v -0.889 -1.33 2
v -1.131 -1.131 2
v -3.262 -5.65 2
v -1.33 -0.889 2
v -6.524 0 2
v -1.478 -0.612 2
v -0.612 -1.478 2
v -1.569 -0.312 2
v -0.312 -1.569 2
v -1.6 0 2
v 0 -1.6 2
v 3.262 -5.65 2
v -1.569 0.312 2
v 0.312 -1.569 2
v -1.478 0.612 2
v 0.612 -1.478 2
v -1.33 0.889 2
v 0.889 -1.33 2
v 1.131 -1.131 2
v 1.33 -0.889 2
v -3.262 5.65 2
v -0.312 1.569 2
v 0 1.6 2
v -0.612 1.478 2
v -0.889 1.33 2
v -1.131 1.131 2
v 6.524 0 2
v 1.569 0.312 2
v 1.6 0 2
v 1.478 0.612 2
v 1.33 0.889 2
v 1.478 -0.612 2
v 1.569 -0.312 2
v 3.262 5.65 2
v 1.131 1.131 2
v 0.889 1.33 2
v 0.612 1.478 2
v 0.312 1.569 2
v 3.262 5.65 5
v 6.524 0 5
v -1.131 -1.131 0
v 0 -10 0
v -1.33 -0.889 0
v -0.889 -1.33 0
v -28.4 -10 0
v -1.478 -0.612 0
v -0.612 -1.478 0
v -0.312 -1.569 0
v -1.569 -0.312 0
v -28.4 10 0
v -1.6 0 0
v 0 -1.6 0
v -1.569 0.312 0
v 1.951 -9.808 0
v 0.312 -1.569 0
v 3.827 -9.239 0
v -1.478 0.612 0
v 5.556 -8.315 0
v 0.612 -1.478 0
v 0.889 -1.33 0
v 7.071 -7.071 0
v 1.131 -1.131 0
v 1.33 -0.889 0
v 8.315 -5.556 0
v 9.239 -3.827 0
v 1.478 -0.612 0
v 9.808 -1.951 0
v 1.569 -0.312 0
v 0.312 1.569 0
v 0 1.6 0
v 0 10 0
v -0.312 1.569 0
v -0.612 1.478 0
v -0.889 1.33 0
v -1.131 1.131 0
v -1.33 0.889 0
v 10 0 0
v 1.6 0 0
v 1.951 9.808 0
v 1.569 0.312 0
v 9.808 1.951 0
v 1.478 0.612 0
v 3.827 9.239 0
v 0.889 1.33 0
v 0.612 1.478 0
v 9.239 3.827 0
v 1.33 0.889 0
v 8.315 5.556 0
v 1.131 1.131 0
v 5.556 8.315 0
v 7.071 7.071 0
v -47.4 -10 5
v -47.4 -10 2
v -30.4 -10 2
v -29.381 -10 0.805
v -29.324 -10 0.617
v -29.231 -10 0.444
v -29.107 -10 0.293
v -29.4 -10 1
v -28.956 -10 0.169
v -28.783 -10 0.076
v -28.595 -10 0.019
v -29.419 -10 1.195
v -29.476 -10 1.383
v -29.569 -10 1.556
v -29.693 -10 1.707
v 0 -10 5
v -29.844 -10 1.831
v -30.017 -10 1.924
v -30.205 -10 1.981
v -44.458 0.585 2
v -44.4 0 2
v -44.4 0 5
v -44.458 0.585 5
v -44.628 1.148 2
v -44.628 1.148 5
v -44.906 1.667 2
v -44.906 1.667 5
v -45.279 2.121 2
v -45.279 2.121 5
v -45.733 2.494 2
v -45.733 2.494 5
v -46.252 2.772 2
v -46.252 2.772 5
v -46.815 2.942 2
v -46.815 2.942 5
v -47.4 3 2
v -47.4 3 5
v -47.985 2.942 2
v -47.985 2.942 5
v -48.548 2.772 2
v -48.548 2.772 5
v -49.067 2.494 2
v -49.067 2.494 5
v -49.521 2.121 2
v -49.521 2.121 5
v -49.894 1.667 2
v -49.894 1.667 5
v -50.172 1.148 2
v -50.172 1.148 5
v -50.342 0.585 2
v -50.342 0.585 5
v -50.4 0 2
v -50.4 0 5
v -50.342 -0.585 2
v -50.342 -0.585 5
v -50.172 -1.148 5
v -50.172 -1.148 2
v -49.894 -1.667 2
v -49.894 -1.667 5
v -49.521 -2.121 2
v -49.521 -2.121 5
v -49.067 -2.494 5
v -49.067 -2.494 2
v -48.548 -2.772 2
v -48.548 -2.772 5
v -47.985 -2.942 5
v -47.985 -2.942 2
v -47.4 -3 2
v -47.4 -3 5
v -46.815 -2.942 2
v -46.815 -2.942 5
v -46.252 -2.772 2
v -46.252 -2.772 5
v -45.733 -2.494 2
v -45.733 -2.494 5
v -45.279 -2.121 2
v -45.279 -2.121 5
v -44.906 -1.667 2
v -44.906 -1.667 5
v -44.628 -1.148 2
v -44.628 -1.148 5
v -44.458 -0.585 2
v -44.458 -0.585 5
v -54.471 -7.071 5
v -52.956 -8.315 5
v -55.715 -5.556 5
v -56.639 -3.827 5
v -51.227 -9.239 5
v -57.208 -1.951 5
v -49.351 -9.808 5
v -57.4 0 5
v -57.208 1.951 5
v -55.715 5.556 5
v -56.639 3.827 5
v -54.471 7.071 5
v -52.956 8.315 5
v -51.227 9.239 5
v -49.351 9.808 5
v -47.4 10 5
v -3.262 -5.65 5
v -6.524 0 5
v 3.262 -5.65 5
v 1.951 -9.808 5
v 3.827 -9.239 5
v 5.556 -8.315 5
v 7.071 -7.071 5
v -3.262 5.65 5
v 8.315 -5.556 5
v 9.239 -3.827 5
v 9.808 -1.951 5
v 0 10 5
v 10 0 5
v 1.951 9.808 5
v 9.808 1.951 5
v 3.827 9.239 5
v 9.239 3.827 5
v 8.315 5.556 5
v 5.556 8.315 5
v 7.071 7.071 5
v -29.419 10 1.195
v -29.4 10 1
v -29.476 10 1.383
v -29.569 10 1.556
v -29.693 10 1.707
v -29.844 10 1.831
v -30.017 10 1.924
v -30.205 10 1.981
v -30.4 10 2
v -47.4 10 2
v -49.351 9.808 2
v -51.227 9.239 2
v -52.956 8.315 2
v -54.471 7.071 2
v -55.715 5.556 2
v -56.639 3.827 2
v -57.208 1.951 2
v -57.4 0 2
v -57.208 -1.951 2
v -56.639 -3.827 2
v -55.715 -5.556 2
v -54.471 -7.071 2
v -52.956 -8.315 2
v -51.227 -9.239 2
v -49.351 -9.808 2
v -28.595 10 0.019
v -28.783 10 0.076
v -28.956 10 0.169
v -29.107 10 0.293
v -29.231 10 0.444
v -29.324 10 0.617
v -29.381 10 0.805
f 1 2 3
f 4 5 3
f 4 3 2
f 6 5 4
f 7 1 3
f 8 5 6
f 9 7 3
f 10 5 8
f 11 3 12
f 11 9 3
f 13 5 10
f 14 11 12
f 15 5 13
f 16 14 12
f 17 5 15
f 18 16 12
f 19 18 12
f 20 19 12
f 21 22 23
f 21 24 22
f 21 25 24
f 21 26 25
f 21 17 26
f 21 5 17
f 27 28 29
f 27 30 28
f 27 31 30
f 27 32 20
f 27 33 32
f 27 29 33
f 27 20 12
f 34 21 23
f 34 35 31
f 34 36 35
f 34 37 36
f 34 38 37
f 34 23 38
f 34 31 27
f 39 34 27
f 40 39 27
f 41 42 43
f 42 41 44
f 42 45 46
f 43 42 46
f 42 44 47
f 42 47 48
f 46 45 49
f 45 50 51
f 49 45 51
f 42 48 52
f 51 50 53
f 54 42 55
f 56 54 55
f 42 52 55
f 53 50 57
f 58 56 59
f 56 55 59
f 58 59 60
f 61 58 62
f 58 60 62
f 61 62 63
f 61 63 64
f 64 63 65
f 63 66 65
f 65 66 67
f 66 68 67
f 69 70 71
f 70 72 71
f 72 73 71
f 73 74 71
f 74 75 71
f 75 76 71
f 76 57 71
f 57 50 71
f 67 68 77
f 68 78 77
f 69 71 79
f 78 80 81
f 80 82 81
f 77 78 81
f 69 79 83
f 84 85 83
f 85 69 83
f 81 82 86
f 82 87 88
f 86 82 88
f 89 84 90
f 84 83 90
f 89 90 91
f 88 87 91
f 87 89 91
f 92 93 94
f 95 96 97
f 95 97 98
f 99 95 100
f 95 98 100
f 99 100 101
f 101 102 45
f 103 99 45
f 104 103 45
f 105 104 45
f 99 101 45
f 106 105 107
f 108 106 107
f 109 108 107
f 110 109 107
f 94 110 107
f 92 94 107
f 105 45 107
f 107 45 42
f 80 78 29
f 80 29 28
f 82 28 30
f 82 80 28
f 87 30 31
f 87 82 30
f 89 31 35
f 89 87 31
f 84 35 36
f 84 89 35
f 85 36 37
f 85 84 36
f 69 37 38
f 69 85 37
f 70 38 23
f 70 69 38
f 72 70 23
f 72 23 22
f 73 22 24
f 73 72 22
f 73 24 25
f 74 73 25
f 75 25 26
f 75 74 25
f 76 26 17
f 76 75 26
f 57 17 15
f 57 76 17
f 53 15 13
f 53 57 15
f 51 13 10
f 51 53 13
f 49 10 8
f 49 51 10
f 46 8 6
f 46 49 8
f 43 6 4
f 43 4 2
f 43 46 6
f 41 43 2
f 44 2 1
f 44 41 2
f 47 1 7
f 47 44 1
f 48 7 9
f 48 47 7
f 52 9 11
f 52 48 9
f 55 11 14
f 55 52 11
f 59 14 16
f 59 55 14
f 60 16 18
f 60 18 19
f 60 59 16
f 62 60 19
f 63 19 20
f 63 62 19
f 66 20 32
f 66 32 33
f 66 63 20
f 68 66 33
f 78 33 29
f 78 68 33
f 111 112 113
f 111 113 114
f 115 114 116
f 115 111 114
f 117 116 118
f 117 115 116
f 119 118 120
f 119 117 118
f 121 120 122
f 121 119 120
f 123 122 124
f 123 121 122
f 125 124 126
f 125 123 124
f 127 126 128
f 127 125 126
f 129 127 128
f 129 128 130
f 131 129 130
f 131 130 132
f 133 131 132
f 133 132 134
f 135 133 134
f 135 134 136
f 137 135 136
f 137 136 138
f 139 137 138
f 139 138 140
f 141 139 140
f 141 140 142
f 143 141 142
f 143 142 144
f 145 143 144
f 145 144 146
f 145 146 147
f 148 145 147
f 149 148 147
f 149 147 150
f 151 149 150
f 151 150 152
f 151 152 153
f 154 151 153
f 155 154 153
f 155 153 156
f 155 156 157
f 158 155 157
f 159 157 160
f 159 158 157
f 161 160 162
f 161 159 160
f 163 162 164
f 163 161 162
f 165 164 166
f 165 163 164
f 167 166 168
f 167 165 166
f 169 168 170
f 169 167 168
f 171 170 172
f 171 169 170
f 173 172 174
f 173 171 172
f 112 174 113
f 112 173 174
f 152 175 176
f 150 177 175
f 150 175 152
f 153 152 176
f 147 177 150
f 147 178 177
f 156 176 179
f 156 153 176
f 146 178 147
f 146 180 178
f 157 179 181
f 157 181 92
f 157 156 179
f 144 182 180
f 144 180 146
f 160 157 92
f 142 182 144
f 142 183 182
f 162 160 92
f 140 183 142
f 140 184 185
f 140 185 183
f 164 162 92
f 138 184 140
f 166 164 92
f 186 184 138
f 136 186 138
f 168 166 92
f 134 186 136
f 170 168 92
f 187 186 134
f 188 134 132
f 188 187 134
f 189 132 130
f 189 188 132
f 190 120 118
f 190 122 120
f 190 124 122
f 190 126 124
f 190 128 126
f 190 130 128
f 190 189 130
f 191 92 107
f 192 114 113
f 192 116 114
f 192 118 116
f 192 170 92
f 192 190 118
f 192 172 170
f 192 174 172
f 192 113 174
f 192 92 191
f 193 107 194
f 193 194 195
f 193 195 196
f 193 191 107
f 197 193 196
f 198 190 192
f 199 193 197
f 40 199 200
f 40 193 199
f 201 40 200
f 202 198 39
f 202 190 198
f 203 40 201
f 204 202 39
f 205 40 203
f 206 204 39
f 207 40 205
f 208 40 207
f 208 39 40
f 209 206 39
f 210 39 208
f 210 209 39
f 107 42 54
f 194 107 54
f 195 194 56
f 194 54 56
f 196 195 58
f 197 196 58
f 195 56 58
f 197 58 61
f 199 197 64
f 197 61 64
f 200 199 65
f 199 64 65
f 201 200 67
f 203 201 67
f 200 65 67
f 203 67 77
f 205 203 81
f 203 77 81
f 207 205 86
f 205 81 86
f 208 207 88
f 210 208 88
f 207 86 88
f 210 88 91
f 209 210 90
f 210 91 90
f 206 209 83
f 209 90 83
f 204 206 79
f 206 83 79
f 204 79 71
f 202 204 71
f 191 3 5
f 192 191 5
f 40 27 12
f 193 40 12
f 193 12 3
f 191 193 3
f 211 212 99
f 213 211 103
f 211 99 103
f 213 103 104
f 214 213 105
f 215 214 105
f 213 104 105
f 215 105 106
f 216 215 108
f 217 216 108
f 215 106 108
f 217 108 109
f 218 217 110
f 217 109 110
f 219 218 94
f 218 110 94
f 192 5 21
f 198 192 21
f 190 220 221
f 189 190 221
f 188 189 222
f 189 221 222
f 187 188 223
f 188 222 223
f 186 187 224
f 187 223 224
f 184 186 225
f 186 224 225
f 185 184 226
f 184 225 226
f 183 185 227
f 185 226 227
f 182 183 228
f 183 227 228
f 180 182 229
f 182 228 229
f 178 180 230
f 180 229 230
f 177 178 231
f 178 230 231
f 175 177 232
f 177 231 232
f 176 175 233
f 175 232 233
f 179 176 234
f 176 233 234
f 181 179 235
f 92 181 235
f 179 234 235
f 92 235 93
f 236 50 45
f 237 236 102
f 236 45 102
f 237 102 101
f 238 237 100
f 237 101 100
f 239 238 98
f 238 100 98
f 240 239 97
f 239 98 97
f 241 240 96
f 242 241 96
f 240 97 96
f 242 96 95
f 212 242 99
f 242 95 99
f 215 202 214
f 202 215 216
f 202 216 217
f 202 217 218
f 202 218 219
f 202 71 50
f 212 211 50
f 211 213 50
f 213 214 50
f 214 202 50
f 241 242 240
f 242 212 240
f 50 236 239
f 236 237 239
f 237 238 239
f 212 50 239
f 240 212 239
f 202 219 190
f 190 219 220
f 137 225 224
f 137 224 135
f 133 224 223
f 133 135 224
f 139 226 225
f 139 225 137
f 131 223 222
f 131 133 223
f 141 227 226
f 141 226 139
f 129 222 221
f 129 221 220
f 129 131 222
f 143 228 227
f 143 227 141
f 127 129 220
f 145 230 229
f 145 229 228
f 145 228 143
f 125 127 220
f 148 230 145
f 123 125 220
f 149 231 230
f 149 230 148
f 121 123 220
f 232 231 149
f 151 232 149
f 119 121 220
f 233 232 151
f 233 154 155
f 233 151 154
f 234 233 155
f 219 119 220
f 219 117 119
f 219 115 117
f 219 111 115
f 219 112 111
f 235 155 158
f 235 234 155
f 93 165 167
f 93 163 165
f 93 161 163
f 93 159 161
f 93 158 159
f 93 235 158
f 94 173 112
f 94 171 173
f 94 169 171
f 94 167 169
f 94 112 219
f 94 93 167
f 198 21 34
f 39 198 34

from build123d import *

# Parameters (mm, degrees)
F0_R     = 3
F1_DEPTH = 5
F0_R_2   = 1.6
F2_DEPTH = 2
F4_W     = 30
F4_H     = 20
F5_DEPTH = 2
F6_R     = 0.99999


# Not quite as in the source:
# - a fillet or chamfer is up to 0.001 mm smaller than in the source, because OpenCascade refuses the exact size


with BuildPart() as f1:
    # F0 (on Top) → F1 (new body)
    with BuildSketch(Plane.XY):
        with BuildLine():
            Line((-47.4, -10), (0, -10))
            ThreePointArc((0, -10), (10, 0), (0, 10))
            Line((0, 10), (-47.4, 10))
            ThreePointArc((-47.4, 10), (-57.4, 0), (-47.4, -10))
        make_face()
        with Locations((-47.4, 0)):
            Circle(F0_R, mode=Mode.SUBTRACT)
        Polygon((-6.5240580418, 0), (-3.2620290209, 5.65), (3.2620290209, 5.65), (6.5240580418, 0), (3.2620290209, -5.65), (-3.2620290209, -5.65), align=None, mode=Mode.SUBTRACT)
    extrude(amount=F1_DEPTH)

    # F0 (on Top) → F2 (join)
    with BuildSketch(Plane.XY):
        Polygon((3.2620290209, 5.65), (-3.2620290209, 5.65), (-6.5240580418, 0), (-3.2620290209, -5.65), (3.2620290209, -5.65), (6.5240580418, 0), align=None)
        Circle(F0_R_2, mode=Mode.SUBTRACT)
    extrude(amount=F2_DEPTH)

    # F4 (on face) → F5 (cut)
    with BuildSketch(Plane(origin=(0, 0, 0), x_dir=(1, 0, 0), z_dir=(0, 0, -1))):
        with Locations((-44.4, 0)):
            Rectangle(F4_W, F4_H)
    extrude(amount=-F5_DEPTH, mode=Mode.SUBTRACT)

    # F6 (radius 1 in the source; OpenCascade refuses exactly that, so slightly less here)
    f6_edges = [f1.edges().sort_by_distance(p)[0] for p in [
        (-29.4, 0, 2),
        (-29.4, 0, 0),
    ]]
    fillet(f6_edges, radius=F6_R)


solid = f1.part
